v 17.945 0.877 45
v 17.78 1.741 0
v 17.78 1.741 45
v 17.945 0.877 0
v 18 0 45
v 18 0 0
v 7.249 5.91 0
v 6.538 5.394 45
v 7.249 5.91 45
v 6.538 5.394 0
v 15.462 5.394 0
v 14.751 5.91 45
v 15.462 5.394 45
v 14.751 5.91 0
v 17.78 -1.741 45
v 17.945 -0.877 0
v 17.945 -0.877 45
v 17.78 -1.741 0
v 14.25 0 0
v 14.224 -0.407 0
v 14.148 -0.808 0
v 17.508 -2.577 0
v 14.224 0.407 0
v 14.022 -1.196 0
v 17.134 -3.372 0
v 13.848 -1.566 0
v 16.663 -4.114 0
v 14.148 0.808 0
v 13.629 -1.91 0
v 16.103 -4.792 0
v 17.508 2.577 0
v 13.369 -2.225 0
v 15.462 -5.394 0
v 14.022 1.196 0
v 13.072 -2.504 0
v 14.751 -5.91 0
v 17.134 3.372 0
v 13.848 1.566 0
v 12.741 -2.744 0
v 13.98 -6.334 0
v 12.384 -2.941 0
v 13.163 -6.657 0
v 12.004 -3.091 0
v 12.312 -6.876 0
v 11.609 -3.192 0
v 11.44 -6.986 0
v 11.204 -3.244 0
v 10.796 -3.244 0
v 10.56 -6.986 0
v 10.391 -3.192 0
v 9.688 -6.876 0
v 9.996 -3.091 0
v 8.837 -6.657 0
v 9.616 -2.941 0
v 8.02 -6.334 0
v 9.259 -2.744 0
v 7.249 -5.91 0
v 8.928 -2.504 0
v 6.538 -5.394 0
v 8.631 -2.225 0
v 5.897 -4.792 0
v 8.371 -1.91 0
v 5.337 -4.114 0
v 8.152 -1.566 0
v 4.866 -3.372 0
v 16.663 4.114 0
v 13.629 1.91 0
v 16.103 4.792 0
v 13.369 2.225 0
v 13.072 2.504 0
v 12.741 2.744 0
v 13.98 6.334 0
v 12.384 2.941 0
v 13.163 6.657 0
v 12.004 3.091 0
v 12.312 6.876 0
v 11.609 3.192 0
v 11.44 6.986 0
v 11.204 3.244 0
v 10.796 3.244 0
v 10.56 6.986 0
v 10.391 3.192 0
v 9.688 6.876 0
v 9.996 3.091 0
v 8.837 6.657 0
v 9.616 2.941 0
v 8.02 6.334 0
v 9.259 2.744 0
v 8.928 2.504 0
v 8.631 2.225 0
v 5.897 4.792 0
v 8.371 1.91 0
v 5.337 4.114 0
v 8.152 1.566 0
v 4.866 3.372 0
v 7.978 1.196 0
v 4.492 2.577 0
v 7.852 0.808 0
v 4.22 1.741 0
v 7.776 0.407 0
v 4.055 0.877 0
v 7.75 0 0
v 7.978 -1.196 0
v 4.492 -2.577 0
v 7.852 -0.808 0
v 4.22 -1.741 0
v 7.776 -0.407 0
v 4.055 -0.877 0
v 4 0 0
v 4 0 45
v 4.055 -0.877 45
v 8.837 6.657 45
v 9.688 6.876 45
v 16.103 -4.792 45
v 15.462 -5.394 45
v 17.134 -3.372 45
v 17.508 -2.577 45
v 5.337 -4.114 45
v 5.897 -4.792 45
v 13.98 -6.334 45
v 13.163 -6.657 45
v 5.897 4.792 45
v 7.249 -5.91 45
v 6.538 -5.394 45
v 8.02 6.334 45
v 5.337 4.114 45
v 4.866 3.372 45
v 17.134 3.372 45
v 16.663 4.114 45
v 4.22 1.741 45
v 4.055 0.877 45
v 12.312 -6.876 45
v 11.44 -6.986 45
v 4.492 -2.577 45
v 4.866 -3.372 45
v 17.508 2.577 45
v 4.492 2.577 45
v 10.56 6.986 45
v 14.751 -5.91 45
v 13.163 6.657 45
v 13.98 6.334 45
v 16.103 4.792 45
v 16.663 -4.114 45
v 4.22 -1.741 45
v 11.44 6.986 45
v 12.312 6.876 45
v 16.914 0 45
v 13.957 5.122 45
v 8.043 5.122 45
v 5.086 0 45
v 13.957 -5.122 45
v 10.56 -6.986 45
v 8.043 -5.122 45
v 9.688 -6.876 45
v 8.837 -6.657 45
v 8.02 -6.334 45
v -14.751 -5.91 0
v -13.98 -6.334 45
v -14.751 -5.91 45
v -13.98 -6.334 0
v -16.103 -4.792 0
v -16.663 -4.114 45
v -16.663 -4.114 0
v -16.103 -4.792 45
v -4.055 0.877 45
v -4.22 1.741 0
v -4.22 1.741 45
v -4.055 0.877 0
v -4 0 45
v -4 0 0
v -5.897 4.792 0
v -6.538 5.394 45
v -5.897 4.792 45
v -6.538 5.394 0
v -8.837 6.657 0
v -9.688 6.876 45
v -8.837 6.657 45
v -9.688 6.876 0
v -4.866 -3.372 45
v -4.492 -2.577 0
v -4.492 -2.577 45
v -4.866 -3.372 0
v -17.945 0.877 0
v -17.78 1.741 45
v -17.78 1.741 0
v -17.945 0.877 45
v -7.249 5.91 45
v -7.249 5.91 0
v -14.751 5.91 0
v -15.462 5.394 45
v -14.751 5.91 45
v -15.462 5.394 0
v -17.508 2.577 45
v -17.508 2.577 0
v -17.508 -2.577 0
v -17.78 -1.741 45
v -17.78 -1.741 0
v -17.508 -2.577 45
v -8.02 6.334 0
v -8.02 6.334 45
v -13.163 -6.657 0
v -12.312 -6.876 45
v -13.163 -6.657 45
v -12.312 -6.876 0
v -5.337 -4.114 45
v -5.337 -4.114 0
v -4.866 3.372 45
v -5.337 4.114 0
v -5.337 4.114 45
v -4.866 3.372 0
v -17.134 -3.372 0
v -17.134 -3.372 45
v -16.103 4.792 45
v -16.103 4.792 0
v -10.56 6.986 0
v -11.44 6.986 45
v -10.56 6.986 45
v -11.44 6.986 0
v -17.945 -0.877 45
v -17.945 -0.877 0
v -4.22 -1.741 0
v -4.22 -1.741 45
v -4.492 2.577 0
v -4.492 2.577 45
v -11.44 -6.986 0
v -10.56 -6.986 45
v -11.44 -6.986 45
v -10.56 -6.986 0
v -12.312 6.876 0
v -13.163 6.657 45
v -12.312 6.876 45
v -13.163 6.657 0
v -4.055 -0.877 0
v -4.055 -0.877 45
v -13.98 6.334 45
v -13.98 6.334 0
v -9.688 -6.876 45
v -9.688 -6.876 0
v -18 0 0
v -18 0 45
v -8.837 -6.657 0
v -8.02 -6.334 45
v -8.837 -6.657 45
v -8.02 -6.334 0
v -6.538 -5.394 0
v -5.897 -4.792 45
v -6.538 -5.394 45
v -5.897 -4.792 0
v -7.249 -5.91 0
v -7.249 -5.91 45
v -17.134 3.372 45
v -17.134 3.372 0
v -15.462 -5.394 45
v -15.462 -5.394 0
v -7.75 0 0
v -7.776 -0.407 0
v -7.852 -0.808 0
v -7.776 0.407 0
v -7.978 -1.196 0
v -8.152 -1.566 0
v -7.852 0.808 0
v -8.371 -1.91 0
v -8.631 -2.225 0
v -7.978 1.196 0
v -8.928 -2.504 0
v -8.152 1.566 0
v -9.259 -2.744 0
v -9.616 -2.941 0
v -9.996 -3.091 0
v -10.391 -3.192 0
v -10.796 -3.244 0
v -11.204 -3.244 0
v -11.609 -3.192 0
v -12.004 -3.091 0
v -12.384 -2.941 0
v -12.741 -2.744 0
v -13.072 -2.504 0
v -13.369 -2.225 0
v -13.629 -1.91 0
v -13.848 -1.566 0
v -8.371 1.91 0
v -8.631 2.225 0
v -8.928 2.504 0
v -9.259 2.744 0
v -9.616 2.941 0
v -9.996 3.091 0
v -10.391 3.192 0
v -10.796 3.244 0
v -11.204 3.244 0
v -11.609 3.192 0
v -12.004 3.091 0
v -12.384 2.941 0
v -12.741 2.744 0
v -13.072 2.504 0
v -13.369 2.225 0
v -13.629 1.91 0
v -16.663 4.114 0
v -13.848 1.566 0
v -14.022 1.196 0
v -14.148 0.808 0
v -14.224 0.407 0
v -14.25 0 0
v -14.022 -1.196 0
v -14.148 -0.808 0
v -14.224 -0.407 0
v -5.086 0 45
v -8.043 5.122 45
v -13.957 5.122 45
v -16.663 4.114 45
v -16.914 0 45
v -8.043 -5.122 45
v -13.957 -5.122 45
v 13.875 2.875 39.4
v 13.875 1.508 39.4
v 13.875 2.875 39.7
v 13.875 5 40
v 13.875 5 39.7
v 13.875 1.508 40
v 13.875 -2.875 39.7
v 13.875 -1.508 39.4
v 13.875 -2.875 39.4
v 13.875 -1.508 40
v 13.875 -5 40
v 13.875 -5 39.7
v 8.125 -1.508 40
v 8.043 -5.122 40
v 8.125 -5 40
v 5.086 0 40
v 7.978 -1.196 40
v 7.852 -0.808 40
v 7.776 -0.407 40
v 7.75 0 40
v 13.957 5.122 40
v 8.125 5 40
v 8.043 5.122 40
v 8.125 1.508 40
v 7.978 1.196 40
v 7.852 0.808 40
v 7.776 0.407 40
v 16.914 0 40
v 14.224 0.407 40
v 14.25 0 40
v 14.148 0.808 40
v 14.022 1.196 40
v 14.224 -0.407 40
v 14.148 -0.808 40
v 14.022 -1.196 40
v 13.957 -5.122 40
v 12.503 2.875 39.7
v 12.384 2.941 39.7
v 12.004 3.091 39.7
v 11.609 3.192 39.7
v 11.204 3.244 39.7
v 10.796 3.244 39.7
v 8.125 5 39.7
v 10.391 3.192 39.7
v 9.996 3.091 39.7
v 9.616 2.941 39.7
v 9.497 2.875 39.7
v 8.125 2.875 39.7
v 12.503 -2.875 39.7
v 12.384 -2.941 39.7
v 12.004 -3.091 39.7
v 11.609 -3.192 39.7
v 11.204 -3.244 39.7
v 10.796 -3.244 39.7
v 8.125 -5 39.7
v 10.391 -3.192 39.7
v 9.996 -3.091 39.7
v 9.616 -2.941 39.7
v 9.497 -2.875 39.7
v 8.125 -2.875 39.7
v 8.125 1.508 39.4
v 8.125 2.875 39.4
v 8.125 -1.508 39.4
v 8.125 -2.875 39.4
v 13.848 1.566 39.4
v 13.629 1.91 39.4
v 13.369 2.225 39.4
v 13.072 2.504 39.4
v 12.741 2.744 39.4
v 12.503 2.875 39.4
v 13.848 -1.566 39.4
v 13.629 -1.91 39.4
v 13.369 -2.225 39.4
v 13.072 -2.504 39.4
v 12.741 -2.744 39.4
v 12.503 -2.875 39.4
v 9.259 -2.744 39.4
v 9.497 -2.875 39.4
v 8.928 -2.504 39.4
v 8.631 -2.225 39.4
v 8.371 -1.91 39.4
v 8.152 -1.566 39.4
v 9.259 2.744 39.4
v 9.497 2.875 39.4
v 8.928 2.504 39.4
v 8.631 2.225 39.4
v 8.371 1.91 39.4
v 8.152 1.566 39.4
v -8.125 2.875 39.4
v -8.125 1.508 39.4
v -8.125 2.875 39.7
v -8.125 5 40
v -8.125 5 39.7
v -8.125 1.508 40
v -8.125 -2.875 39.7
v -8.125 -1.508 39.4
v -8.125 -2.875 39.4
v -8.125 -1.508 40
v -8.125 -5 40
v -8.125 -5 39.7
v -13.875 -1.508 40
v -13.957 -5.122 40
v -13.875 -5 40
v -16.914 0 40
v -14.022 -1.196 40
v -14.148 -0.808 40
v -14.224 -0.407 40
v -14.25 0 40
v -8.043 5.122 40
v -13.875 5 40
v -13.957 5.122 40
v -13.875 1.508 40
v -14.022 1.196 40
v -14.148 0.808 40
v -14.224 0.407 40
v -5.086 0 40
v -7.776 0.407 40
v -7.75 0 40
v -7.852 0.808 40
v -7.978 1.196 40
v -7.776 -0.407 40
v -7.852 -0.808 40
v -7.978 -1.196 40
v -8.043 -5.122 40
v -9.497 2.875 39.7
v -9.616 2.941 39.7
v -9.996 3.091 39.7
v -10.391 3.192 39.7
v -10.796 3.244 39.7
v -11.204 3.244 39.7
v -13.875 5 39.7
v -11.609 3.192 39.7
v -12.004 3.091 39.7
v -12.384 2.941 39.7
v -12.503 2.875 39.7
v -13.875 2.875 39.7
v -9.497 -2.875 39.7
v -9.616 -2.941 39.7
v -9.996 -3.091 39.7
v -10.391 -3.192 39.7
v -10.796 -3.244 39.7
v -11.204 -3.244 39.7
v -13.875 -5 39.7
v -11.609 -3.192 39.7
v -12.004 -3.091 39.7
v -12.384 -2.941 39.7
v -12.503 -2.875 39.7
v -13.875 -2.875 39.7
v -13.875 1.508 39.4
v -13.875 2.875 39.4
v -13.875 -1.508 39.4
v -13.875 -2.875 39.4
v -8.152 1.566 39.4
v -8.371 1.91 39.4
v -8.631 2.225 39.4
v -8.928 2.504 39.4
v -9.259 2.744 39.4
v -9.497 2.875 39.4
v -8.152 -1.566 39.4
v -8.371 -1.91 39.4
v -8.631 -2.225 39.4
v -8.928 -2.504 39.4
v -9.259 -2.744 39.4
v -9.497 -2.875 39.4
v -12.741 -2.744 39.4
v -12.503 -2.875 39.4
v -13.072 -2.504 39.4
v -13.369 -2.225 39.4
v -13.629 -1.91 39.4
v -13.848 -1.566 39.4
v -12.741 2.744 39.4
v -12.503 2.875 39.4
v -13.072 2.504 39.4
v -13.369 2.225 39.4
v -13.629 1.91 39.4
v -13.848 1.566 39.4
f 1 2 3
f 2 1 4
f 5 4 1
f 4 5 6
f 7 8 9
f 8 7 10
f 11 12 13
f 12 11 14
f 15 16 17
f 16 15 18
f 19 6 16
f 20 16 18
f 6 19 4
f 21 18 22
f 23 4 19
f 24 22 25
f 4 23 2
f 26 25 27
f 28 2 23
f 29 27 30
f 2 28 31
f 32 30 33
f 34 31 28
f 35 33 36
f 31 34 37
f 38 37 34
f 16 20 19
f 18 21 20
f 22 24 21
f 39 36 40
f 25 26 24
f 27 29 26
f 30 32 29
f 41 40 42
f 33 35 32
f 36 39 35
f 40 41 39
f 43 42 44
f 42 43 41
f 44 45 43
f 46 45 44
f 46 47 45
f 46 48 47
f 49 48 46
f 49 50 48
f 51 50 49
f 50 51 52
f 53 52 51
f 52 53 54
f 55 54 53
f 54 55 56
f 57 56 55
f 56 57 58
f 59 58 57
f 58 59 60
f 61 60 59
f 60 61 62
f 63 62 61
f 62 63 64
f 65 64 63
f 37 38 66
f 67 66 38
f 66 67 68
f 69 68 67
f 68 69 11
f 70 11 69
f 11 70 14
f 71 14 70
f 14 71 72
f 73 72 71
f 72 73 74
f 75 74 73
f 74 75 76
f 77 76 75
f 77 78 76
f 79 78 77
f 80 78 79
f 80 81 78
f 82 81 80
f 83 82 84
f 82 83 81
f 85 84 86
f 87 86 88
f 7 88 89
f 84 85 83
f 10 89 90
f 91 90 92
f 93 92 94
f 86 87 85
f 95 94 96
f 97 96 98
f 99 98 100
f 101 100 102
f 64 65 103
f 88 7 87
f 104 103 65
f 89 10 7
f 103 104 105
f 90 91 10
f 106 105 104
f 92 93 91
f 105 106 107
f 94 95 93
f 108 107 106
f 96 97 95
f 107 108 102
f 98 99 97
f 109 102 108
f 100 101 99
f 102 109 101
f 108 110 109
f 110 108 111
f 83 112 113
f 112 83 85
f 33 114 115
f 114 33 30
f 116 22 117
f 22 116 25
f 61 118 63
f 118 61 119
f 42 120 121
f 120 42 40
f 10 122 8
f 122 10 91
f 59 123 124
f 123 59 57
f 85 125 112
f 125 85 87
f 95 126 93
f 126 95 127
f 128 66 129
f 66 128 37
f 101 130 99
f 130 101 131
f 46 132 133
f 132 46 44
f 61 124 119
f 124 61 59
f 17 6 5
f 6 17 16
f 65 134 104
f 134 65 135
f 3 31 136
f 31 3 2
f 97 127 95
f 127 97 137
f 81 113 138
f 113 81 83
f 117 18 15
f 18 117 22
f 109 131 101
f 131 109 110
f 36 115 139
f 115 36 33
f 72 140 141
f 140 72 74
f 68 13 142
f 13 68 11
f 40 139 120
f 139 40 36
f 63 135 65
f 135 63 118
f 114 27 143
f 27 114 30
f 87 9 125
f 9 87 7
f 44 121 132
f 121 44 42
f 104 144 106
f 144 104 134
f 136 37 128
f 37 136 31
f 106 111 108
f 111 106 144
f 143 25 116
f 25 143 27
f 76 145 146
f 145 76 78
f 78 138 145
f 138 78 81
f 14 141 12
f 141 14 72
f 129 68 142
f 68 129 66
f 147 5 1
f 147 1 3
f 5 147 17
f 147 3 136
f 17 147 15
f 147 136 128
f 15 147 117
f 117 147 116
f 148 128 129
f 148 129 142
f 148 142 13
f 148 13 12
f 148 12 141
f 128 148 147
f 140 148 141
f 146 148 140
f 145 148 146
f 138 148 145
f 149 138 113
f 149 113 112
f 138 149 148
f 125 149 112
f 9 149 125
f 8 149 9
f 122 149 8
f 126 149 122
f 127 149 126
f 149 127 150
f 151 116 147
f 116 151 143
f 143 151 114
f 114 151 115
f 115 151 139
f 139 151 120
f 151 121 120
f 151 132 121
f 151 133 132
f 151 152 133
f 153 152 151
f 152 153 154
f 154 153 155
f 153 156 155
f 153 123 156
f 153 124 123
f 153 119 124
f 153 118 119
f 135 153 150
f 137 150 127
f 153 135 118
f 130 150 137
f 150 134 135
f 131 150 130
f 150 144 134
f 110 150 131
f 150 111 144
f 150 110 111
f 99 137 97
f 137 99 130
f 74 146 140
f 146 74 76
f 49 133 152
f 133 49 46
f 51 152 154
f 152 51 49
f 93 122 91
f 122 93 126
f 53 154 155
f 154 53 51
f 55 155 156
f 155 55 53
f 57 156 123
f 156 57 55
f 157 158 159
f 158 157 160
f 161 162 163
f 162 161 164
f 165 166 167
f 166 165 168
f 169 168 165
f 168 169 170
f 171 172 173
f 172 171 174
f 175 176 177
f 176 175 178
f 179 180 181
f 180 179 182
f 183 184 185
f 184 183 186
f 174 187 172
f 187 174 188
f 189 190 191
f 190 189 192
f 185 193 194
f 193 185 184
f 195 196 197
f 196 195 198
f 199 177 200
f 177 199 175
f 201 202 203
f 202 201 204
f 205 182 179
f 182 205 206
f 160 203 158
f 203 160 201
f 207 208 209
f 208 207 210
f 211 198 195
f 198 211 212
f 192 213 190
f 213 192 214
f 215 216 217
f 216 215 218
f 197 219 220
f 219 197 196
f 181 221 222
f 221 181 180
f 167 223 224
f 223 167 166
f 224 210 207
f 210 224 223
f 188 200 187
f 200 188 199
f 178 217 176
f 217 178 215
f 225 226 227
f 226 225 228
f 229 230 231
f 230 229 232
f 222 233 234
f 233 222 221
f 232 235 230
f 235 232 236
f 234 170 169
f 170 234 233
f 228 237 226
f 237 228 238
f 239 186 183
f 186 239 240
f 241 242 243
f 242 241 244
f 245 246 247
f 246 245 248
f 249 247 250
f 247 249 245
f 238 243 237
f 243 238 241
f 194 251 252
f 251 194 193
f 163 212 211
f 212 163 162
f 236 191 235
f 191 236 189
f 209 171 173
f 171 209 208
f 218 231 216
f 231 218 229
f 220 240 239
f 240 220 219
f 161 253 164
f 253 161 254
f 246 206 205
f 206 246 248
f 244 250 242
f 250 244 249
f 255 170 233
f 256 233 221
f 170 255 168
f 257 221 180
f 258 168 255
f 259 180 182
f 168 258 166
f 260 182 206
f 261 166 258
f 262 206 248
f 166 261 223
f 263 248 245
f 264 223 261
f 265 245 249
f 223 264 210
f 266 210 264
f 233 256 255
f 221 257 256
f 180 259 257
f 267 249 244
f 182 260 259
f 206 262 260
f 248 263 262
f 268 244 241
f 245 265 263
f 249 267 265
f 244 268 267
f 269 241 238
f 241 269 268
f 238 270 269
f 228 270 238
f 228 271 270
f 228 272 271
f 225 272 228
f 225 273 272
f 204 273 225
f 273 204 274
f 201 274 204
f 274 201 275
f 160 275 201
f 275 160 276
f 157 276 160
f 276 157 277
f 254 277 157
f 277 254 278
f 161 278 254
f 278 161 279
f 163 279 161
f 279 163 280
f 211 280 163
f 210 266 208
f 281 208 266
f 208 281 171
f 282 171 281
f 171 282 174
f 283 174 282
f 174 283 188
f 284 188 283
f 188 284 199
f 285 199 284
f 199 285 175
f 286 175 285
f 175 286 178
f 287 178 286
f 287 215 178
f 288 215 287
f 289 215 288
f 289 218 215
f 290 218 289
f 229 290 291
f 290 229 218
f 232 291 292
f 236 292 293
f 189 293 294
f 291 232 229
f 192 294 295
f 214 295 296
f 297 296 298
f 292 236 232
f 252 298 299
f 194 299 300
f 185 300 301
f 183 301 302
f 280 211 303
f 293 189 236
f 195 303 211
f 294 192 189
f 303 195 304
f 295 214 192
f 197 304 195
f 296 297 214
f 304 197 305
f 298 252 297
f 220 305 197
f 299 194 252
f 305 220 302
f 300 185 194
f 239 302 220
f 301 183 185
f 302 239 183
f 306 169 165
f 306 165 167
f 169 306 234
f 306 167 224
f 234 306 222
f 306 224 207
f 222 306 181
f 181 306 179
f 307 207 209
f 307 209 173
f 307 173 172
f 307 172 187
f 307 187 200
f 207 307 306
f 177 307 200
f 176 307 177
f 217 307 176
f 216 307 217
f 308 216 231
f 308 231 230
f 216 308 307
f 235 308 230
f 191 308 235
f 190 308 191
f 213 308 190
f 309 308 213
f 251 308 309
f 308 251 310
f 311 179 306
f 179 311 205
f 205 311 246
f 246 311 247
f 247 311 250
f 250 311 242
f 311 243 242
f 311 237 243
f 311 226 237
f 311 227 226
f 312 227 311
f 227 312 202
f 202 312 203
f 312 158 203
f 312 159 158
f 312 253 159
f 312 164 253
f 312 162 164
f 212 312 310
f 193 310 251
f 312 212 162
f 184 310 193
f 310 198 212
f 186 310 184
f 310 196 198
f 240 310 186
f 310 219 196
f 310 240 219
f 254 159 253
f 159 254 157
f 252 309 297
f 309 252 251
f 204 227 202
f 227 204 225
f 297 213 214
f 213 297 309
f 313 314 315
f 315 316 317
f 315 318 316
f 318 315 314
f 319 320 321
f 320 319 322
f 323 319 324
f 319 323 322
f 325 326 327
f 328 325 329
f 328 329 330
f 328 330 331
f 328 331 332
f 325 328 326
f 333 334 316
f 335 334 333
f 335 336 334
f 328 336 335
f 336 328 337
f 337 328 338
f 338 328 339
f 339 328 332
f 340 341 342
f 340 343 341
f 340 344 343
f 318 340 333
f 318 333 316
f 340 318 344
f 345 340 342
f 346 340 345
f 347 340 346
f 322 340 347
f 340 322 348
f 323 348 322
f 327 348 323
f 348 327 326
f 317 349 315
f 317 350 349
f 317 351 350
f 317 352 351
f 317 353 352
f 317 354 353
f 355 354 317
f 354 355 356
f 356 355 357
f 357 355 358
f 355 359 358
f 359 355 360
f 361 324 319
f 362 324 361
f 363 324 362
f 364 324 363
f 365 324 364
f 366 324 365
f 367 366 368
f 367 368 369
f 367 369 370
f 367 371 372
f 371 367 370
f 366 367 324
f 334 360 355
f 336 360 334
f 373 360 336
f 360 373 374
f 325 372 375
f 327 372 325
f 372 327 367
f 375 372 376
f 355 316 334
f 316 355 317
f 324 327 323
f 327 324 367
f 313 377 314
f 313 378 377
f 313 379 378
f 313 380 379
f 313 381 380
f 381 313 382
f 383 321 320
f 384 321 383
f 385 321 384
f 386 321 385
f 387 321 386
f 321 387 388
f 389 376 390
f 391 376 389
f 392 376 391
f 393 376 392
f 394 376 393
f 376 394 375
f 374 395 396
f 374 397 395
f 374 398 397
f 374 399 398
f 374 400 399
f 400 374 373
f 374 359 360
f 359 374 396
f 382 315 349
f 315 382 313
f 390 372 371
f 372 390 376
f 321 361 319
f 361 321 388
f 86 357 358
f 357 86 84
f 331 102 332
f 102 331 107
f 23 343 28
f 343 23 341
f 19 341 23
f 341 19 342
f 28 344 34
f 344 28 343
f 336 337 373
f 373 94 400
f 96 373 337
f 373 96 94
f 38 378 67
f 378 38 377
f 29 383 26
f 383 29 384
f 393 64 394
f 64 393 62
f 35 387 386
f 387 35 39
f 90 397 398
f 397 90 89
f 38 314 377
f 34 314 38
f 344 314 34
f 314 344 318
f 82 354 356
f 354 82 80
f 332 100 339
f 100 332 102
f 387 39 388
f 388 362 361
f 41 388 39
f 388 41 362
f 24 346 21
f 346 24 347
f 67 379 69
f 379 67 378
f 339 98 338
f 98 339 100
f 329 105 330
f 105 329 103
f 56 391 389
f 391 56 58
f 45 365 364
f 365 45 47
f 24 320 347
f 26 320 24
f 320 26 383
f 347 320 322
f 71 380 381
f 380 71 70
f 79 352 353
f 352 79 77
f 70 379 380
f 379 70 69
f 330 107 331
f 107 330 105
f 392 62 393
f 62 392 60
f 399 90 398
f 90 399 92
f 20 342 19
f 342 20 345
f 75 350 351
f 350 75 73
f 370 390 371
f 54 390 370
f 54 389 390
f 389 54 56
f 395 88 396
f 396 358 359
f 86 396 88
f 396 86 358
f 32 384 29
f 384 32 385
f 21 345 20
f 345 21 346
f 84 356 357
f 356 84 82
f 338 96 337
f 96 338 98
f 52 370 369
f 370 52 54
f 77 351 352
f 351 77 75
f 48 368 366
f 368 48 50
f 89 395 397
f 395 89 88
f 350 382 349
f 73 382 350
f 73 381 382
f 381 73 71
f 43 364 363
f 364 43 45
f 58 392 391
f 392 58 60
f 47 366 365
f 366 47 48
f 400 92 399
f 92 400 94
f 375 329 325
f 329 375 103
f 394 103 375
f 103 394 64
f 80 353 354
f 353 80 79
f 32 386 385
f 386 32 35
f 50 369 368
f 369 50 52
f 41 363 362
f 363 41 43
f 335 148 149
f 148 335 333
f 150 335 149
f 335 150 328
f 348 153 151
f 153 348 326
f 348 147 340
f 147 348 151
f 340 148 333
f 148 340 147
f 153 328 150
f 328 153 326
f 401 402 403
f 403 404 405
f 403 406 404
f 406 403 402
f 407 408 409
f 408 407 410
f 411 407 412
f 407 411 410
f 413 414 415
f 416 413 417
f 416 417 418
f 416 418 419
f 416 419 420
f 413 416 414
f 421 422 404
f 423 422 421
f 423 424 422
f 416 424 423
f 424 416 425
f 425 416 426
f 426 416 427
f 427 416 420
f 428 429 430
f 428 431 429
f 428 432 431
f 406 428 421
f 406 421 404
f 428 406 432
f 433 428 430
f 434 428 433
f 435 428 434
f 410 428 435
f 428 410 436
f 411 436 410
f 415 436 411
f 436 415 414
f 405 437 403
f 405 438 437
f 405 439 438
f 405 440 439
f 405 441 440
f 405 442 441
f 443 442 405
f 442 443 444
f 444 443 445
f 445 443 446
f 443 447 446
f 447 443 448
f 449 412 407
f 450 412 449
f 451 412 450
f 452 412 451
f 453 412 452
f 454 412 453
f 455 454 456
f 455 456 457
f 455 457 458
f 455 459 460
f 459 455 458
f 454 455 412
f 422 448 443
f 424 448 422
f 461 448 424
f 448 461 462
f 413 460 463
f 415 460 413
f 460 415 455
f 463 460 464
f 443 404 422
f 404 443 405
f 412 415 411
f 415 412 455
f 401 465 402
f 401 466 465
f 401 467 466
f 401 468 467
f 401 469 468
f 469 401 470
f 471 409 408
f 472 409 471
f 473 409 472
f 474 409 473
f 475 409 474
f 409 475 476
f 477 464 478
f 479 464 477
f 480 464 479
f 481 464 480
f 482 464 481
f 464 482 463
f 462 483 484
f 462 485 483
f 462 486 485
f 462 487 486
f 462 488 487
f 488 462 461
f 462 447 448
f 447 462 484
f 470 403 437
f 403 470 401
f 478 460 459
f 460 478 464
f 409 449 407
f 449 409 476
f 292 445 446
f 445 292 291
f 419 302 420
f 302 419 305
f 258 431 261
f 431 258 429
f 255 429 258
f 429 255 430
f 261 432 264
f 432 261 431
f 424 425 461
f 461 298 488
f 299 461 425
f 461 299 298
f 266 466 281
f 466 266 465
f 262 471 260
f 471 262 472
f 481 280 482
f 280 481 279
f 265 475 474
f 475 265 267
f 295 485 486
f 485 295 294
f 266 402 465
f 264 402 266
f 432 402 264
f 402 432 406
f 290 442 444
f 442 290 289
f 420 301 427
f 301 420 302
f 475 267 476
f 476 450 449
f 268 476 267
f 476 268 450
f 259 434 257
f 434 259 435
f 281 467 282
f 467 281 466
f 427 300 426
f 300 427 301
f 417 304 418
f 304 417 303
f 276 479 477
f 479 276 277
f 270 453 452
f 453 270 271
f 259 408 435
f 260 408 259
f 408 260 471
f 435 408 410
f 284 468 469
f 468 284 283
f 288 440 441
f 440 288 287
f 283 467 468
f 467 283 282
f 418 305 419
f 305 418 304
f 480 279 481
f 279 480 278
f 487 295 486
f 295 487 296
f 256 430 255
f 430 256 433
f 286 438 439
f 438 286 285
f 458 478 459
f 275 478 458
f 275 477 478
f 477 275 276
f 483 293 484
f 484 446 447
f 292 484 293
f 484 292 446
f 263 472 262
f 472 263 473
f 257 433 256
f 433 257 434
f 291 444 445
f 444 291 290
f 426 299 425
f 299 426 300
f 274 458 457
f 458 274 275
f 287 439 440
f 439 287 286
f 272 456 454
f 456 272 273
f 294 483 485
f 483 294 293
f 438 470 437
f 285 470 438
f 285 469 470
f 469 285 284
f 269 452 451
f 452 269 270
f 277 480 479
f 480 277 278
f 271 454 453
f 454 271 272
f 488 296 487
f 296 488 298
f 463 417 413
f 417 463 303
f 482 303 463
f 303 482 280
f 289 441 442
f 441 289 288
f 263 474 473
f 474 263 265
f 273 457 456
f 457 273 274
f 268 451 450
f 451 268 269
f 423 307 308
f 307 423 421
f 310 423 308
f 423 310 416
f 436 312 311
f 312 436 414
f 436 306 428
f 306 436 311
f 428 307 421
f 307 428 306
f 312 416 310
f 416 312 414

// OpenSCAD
$fn = 50;


difference() {
	union() {
		translate(v = [11.0000000000, 0, 0.0000000000]) {
			cylinder(h = 45, r = 7.0000000000);
		}
		translate(v = [-11.0000000000, 0, 0.0000000000]) {
			cylinder(h = 45, r = 7.0000000000);
		}
	}
	union() {
		translate(v = [11.0000000000, 0, 45]) {
			rotate(a = [0, 0, 0]) {
				difference() {
					union() {
						#translate(v = [-2.8750000000, -5.0000000000, -5.3000000000]) {
							cube(size = [5.7500000000, 10, 0.3000000000]);
						}
						#translate(v = [-2.8750000000, -2.8750000000, -5.6000000000]) {
							cube(size = [5.7500000000, 5.7500000000, 0.3000000000]);
						}
						#translate(v = [-2.8750000000, -5.0000000000, 0]) {
							cube(size = [5.7500000000, 10, 0.3000000000]);
						}
						#translate(v = [-2.8750000000, -2.8750000000, 0.3000000000]) {
							cube(size = [5.7500000000, 5.7500000000, 0.3000000000]);
						}
						#translate(v = [0, 0, -100.0000000000]) {
							cylinder(h = 200, r = 3.2500000000);
						}
						translate(v = [0, 0, -5]) {
							#linear_extrude(height = 5) {
								polygon(points = [[5.9142500000, 0.0000000000], [2.9571250000, 5.1218907443], [-2.9571250000, 5.1218907443], [-5.9142500000, 0.0000000000], [-2.9571250000, -5.1218907443], [2.9571250000, -5.1218907443]]);
							}
						}
						#translate(v = [-2.8750000000, -5.0000000000, -5.3000000000]) {
							cube(size = [5.7500000000, 10, 0.3000000000]);
						}
						#translate(v = [-2.8750000000, -2.8750000000, -5.6000000000]) {
							cube(size = [5.7500000000, 5.7500000000, 0.3000000000]);
						}
						#translate(v = [-2.8750000000, -5.0000000000, 0]) {
							cube(size = [5.7500000000, 10, 0.3000000000]);
						}
						#translate(v = [-2.8750000000, -2.8750000000, 0.3000000000]) {
							cube(size = [5.7500000000, 5.7500000000, 0.3000000000]);
						}
						#translate(v = [0, 0, -100.0000000000]) {
							cylinder(h = 200, r = 3.2500000000);
						}
						#translate(v = [-2.8750000000, -5.0000000000, -5.3000000000]) {
							cube(size = [5.7500000000, 10, 0.3000000000]);
						}
						#translate(v = [-2.8750000000, -2.8750000000, -5.6000000000]) {
							cube(size = [5.7500000000, 5.7500000000, 0.3000000000]);
						}
						#translate(v = [-2.8750000000, -5.0000000000, 0]) {
							cube(size = [5.7500000000, 10, 0.3000000000]);
						}
						#translate(v = [-2.8750000000, -2.8750000000, 0.3000000000]) {
							cube(size = [5.7500000000, 5.7500000000, 0.3000000000]);
						}
						#translate(v = [0, 0, -100.0000000000]) {
							cylinder(h = 200, r = 3.2500000000);
						}
					}
					union();
				}
			}
		}
		translate(v = [-11.0000000000, 0, 45]) {
			rotate(a = [0, 0, 0]) {
				difference() {
					union() {
						#translate(v = [-2.8750000000, -5.0000000000, -5.3000000000]) {
							cube(size = [5.7500000000, 10, 0.3000000000]);
						}
						#translate(v = [-2.8750000000, -2.8750000000, -5.6000000000]) {
							cube(size = [5.7500000000, 5.7500000000, 0.3000000000]);
						}
						#translate(v = [-2.8750000000, -5.0000000000, 0]) {
							cube(size = [5.7500000000, 10, 0.3000000000]);
						}
						#translate(v = [-2.8750000000, -2.8750000000, 0.3000000000]) {
							cube(size = [5.7500000000, 5.7500000000, 0.3000000000]);
						}
						#translate(v = [0, 0, -100.0000000000]) {
							cylinder(h = 200, r = 3.2500000000);
						}
						translate(v = [0, 0, -5]) {
							#linear_extrude(height = 5) {
								polygon(points = [[5.9142500000, 0.0000000000], [2.9571250000, 5.1218907443], [-2.9571250000, 5.1218907443], [-5.9142500000, 0.0000000000], [-2.9571250000, -5.1218907443], [2.9571250000, -5.1218907443]]);
							}
						}
						#translate(v = [-2.8750000000, -5.0000000000, -5.3000000000]) {
							cube(size = [5.7500000000, 10, 0.3000000000]);
						}
						#translate(v = [-2.8750000000, -2.8750000000, -5.6000000000]) {
							cube(size = [5.7500000000, 5.7500000000, 0.3000000000]);
						}
						#translate(v = [-2.8750000000, -5.0000000000, 0]) {
							cube(size = [5.7500000000, 10, 0.3000000000]);
						}
						#translate(v = [-2.8750000000, -2.8750000000, 0.3000000000]) {
							cube(size = [5.7500000000, 5.7500000000, 0.3000000000]);
						}
						#translate(v = [0, 0, -100.0000000000]) {
							cylinder(h = 200, r = 3.2500000000);
						}
						#translate(v = [-2.8750000000, -5.0000000000, -5.3000000000]) {
							cube(size = [5.7500000000, 10, 0.3000000000]);
						}
						#translate(v = [-2.8750000000, -2.8750000000, -5.6000000000]) {
							cube(size = [5.7500000000, 5.7500000000, 0.3000000000]);
						}
						#translate(v = [-2.8750000000, -5.0000000000, 0]) {
							cube(size = [5.7500000000, 10, 0.3000000000]);
						}
						#translate(v = [-2.8750000000, -2.8750000000, 0.3000000000]) {
							cube(size = [5.7500000000, 5.7500000000, 0.3000000000]);
						}
						#translate(v = [0, 0, -100.0000000000]) {
							cylinder(h = 200, r = 3.2500000000);
						}
					}
					union();
				}
			}
		}
	}
}
